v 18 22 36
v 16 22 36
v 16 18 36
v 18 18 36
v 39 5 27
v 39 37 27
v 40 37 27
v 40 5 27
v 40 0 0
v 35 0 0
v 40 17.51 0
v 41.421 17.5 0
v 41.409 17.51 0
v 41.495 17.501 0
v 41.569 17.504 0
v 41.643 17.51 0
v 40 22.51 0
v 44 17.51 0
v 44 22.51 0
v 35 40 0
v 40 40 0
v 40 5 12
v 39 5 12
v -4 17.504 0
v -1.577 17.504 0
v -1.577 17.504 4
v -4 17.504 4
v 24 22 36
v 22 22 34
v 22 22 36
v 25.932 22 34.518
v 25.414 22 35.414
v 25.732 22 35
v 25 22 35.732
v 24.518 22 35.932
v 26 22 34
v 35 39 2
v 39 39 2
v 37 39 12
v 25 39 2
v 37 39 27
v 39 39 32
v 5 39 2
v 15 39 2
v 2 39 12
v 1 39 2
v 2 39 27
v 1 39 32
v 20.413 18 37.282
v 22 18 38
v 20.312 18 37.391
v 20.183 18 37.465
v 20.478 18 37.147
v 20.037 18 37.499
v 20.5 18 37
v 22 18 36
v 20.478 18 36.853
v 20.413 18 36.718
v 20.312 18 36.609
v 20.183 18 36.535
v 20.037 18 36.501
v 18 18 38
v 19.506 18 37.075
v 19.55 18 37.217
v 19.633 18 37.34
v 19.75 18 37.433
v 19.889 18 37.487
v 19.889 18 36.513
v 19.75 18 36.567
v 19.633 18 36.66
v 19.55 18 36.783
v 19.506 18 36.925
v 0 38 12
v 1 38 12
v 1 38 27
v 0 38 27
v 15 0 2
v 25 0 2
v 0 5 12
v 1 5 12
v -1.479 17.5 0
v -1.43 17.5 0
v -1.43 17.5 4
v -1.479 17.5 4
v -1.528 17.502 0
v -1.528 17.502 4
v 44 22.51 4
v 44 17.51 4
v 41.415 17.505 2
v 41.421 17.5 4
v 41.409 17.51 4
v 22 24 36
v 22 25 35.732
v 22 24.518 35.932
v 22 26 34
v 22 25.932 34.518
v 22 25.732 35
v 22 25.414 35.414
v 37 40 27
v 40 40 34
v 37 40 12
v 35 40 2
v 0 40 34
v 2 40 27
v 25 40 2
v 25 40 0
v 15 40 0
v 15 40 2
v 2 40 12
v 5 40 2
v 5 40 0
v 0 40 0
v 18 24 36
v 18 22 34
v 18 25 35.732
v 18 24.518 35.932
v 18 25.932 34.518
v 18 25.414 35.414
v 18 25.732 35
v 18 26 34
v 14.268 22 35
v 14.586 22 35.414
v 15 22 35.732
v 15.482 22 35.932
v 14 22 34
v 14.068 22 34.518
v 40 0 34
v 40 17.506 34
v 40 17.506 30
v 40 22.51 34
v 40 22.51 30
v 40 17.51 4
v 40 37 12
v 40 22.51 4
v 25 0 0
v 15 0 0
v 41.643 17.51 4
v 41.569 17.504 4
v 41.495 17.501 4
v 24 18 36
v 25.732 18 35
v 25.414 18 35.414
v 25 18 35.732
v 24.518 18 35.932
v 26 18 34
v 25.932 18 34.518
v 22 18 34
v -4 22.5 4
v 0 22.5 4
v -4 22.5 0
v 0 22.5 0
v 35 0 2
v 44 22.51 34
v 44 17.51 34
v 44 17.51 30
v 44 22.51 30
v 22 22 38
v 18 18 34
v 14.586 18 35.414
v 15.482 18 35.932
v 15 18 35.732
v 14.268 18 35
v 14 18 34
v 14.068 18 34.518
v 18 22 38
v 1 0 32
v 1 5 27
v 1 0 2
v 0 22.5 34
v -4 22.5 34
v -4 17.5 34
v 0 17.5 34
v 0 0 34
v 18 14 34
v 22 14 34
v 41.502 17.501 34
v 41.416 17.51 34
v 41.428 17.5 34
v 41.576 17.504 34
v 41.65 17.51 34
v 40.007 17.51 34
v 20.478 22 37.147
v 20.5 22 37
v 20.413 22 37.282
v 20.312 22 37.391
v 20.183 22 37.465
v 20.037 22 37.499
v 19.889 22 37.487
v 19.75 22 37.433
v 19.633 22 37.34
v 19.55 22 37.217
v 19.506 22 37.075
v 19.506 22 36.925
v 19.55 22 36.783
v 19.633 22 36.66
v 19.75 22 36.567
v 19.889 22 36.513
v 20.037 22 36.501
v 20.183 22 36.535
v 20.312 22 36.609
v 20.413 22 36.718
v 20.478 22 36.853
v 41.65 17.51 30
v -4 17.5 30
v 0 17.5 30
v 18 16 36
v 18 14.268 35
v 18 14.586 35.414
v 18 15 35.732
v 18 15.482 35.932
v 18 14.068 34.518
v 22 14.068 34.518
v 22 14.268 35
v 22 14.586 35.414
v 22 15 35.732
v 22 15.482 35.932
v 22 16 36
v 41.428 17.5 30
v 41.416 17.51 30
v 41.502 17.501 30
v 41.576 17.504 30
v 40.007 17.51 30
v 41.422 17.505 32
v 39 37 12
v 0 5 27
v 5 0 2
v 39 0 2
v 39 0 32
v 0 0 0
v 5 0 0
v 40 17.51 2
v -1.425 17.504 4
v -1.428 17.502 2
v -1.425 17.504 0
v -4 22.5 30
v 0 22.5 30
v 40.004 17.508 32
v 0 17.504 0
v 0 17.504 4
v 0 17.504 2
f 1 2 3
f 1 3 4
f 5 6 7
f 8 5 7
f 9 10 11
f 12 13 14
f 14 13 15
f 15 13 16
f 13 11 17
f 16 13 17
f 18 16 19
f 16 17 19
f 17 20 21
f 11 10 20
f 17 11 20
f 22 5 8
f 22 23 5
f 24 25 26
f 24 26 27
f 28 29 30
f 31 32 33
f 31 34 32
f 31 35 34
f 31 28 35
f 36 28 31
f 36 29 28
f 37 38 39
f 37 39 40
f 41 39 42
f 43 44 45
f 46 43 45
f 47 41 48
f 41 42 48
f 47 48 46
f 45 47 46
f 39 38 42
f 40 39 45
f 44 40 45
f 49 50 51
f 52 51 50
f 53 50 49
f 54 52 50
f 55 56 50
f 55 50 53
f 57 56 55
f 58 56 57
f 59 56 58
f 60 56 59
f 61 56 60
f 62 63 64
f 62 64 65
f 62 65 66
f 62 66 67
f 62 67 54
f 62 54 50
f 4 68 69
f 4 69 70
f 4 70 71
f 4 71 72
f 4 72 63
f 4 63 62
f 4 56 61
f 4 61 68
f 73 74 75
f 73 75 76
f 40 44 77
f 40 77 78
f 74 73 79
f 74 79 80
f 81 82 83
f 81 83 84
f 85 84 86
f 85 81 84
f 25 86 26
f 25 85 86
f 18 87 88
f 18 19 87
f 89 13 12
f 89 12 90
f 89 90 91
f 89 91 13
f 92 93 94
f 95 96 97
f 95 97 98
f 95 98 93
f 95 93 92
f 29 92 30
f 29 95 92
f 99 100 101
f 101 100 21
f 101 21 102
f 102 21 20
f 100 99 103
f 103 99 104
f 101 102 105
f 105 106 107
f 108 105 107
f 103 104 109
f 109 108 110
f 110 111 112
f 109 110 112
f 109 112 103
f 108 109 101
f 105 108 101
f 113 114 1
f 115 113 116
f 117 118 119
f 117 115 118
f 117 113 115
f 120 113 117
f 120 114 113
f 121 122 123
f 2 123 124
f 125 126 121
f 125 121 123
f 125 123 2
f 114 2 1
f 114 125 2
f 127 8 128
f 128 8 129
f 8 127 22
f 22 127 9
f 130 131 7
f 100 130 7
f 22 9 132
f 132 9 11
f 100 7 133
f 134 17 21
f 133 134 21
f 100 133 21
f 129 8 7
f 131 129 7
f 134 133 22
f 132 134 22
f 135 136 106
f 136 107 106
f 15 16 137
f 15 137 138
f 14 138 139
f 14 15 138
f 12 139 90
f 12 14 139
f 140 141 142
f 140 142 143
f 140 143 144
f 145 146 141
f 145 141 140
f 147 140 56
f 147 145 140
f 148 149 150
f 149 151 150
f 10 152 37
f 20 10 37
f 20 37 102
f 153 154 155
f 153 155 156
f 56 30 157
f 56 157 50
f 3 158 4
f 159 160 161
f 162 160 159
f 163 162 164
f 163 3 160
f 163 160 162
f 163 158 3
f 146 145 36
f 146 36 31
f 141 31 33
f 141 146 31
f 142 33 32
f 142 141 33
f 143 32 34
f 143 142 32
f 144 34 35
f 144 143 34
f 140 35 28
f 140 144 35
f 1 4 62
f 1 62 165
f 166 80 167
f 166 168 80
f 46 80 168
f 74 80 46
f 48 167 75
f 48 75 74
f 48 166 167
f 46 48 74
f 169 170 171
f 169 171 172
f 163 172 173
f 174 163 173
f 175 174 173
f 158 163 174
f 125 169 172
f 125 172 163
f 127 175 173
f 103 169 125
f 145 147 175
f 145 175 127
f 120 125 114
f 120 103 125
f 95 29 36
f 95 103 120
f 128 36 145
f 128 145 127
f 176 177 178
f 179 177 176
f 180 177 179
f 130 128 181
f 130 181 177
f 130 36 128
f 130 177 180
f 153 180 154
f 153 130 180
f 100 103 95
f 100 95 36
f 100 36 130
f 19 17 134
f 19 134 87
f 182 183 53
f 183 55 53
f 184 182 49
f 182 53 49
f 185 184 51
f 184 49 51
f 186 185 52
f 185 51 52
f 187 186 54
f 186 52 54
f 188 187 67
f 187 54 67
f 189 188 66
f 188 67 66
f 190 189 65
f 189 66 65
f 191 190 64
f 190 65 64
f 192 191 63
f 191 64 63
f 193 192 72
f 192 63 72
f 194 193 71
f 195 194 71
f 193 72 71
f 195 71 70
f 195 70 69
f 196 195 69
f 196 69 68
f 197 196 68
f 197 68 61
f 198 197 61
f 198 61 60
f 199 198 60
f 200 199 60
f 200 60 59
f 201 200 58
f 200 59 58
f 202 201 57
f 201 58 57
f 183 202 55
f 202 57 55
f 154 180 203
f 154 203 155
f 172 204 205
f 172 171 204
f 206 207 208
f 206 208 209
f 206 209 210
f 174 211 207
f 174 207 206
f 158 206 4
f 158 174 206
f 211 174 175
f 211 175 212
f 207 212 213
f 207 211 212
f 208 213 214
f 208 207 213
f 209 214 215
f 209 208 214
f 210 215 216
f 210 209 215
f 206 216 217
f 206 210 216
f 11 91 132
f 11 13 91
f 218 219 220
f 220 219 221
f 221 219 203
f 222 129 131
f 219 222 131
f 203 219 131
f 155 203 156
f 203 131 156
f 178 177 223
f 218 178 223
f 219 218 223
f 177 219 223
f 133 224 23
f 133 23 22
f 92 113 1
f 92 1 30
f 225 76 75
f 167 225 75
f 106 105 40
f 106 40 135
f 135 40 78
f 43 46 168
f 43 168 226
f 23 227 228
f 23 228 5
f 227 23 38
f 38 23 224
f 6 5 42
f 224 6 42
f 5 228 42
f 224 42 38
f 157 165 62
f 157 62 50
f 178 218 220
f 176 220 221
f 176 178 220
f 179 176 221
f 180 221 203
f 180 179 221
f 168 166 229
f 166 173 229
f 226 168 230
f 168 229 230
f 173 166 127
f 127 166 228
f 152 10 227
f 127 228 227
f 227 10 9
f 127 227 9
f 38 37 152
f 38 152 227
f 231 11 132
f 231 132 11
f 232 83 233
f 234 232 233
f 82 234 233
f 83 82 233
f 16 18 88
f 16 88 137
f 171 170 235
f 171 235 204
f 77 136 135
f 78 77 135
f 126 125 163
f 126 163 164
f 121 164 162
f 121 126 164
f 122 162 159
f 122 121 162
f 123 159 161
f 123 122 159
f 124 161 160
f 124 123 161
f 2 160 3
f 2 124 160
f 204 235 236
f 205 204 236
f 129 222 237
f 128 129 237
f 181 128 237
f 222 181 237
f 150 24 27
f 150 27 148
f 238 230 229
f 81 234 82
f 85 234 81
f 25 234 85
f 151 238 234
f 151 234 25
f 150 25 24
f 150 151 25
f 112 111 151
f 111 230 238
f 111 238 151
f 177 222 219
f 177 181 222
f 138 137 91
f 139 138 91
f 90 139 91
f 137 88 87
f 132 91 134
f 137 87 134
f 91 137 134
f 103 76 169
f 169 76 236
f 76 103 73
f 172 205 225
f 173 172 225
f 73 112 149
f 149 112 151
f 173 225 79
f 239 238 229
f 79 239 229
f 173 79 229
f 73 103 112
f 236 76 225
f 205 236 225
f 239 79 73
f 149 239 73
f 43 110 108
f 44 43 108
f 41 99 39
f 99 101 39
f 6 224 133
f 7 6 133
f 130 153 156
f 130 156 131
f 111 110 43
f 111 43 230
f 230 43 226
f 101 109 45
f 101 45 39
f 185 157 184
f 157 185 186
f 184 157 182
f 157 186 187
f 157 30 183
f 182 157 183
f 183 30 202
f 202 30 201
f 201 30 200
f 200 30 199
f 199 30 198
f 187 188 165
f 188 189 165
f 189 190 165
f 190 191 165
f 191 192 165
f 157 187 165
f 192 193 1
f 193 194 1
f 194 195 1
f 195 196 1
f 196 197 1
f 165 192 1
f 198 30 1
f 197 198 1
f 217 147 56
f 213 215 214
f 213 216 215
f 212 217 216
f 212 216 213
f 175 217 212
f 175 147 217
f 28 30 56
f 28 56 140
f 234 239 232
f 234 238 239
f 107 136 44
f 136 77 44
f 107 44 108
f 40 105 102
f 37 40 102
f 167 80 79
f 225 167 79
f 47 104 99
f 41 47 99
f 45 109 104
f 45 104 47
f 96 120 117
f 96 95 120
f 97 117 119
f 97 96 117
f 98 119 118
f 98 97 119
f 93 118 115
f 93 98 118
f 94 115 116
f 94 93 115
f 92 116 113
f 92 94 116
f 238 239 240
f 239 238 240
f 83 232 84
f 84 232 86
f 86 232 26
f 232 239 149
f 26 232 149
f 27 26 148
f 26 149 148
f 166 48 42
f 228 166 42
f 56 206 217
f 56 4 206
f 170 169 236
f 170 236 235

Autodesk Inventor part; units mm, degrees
ref_plane "YZ Plane" through (0, 0, 0) normal (1, 0, 0) x (0, 1, 0)
ref_plane "XZ Plane" through (0, 0, 0) normal (0, 1, 0) x (-1, 0, 0)
ref_plane "XY Plane" through (0, 0, 0) normal (0, 0, 1) x (1, 0, 0)
sketch "Esboço1" plane through (0, 0, 0) normal (0, 0, 1) x (1, 0, 0)
  line L0 (0, 0) -> (40, 0)
  line L1 (40, 0) -> (40, 40)
  line L2 (40, 40) -> (0, 40)
  line L3 (0, 40) -> (0, 0)
  dimension "d0" = 40
  dimension "d1" = 40
extrude "Extrusão1" add sketch "Esboço1" along normal blind 2
sketch "Esboço2" plane through (0, 0, 2) normal (0, 0, 1) x (1, 0, 0)
  line L0 (0, 40) -> (0, 0) projected
  line L1 (0, 0) -> (1, 0)
  line L2 (0, 0) -> (40, 0) projected
  line L3 (0, 0) -> (0, 40)
  line L4 (40, 40) -> (0, 40) projected
  line L5 (40, 0) -> (40, 40) projected
  line L6 (40, 40) -> (40, 0)
  line L7 (40, 0) -> (39, 0)
  line L8 (39, 0) -> (39, 39)
  line L9 (39, 39) -> (1, 39)
  line L10 (1, 39) -> (1, 0)
extrude "Extrusão2" add sketch "Esboço2" along normal blind 10 contours L4 L5 L2 L8 L9 L10 L1 L0
sketch "Esboço3" plane through (0, 0, 12) normal (0, 0, 1) x (1, 0, 0)
  line L0 (0, 40) -> (2, 40)
  line L1 (40, 40) -> (0, 40) projected
  line L2 (1, 39) -> (39, 39) projected
  line L3 (2, 39) -> (1, 39)
  line L4 (1, 39) -> (1, 38)
  line L5 (1, 0) -> (1, 39) projected
  line L6 (0, 38) -> (0, 40)
  line L7 (2, 40) -> (2, 39)
  line L8 (1, 38) -> (0, 38)
  line L9 (0, 40) -> (0, 0) projected
extrude "Extrusão3" add sketch "Esboço3" along normal blind 20
sketch "Esboço4" plane through (0, 0, 12) normal (0, 0, 1) x (1, 0, 0)
  line L0 (40, 40) -> (37, 40)
  line L1 (40, 40) -> (0, 40) projected
  line L2 (39, 39) -> (1, 39) projected
  line L3 (37, 39) -> (39, 39)
  line L4 (39, 39) -> (39, 37)
  line L5 (39, 39) -> (39, 0) projected
  line L6 (40, 0) -> (40, 40) projected
  line L7 (40, 37) -> (40, 40)
  line L8 (37, 40) -> (37, 39)
  line L9 (39, 37) -> (40, 37)
  line L10 (40, 40) -> (37, 40)
  line L11 (37, 39) -> (39, 39)
  line L12 (39, 39) -> (39, 37)
  point P0 (0, 0)
extrude "Extrusão4" add sketch "Esboço4" along normal blind 20
sketch "Esboço6" plane through (0, 0, 12) normal (0, 0, 1) x (1, 0, 0)
  line L0 (0, 38) -> (0, 0) projected
  line L1 (1, 0) -> (1, 38) projected
  line L2 (0, 0) -> (1, 0)
  line L3 (1, 0) -> (1, 5)
  line L4 (1, 5) -> (0, 5)
  line L5 (0, 5) -> (0, 0)
  line L6 (0, 0) -> (40, 0) projected
  line L7 (39, 0) -> (39, 39) projected
  line L8 (40, 0) -> (39, 0)
  line L9 (39, 0) -> (39, 5)
  line L10 (39, 5) -> (40, 5)
  line L11 (40, 5) -> (40, 0)
extrude "Extrusão5" add sketch "Esboço6" along normal blind 20
sketch "Esboço7" plane through (0, 0, 32) normal (0, 0, 1) x (1, 0, 0)
  line L0 (0, 38) -> (0, 5) projected
  line L1 (0, 38) -> (1, 38)
  line L2 (1, 5) -> (1, 38) projected
  line L3 (1, 38) -> (1, 5)
  line L4 (1, 5) -> (0, 5)
  line L5 (0, 40) -> (0, 38) projected
  line L6 (0, 5) -> (0, 38)
  point P0 (0, 0)
extrude "Extrusão6" add sketch "Esboço7" against normal blind 5
sketch "Esboço8" plane through (0, 0, 32) normal (0, 0, 1) x (1, 0, 0)
  line L0 (2, 40) -> (0, 40) projected
  line L1 (39, 39) -> (1, 39) projected
  line L2 (2, 40) -> (37, 40)
  line L3 (37, 40) -> (37, 39)
  line L4 (37, 39) -> (2, 39)
  line L5 (2, 39) -> (2, 40)
  point P0 (0, 0)
extrude "Extrusão7" add sketch "Esboço8" against normal blind 5
sketch "Esboço9" plane through (0, 0, 32) normal (0, 0, 1) x (1, 0, 0)
  line L0 (40, 0) -> (40, 40) projected
  line L1 (39, 37) -> (40, 37)
  line L2 (40, 37) -> (40, 5)
  line L3 (40, 5) -> (39, 5)
  line L4 (39, 5) -> (39, 37)
  point P0 (0, 0)
extrude "Extrusão8" add sketch "Esboço9" against normal blind 5
sketch "Esboço10" plane through (0, 0, 32) normal (0, 0, 1) x (1, 0, 0)
  line L0 (40, 40) -> (0, 40) projected
  line L1 (0, 40) -> (0, 0) projected
  line L2 (40, 40) -> (0, 40)
  line L3 (0, 40) -> (0, 0)
  line L4 (0, 0) -> (40, 0)
  line L5 (40, 0) -> (40, 40)
extrude "Extrusão9" add sketch "Esboço10" along normal blind 2
sketch "Esboço14" plane through (0, 0, 34) normal (0, 0, 1) x (1, 0, 0)
  line L0 (0, 40) -> (0, 0) projected
  line L1 (0, 40) -> (0, 20)
  circle A0 centre (-1.4378, 20) radius 2.5
  line L2 (-1.4378, 17.5) -> (-0.8668, 18) construction
  line L3 (-0.8668, 18) -> (0, 17.5) construction
  spline S0 degree 2 poles (-1.4378, 17.5) (-0.8668, 18) (0, 17.5) knots 1 1 1 2 2 2
  line L4 (40, 0) -> (40, 40) projected
  line L5 (40, 40) -> (40, 0)
  line L6 (40, 40) -> (0, 40) projected
  line L7 (0, 40) -> (0, 0)
  circle A1 centre (41.4279, 20) radius 2.5
  line L8 (41.4279, 17.5) -> (40.8569, 18) construction
  line L9 (40.8569, 18) -> (39.9901, 17.5) construction
  spline S1 degree 2 poles (41.4279, 17.5) (40.8569, 18) (39.9901, 17.5) knots 1 1 1 2 2 2
  line L10 (-1.4378, 20) -> (40, 20)
  line L11 (-1.4378, 22.5) -> (-0.8668, 22) construction
  line L12 (-0.8668, 22) -> (0, 22.5) construction
  spline S2 degree 2 poles (-1.4378, 22.5) (-0.8668, 22) (0, 22.5) knots 1 1 1 2 2 2
  spline S3 degree 2 poles (41.4279, 22.5) (40.8569, 22) (39.9901, 22.5) knots 1 1 1 2 2 2
  line L13 (41.4279, 22.5) -> (40.8569, 22) construction
  line L14 (40.8569, 22) -> (39.9901, 22.5) construction
  point P0 (40, 22.4943)
  point P1 (40, 17.5057)
  point P2 (0, 22.5)
  dimension "d30" = 5
extrude "Extrusão11" add sketch "Esboço14" against normal blind 4 contours L0 A0 S2 | L0 A0 S0 S2 | S3 A1 L4 | A1 S3 S1 L4 | L0 S0 A0 | A1 S1 L4
sketch "Esboço15" plane through (0, 0, 0) normal (0, 0, -1) x (-1, 0, 0)
  spline S0 degree 2 poles (1.4304, 17.5) (0.8594, 18) (-0.0074, 17.5) knots 1 1 1 2 2 2
  line L0 (1.4304, 17.5) -> (0.8594, 18) construction
  line L1 (0.8594, 18) -> (-0.0074, 17.5) construction
  circle A0 centre (1.4304, 20) radius 2.5
  spline S1 degree 2 poles (1.4304, 22.5) (0.8594, 22) (-0.0074, 22.5) knots 1 1 1 2 2 2
  line L2 (1.4304, 22.5) -> (0.8594, 22) construction
  line L3 (0.8594, 22) -> (-0.0074, 22.5) construction
  line L4 (-40, 40) -> (0, 40) projected
  line L5 (-40, 40) -> (-40, 0)
  line L6 (-39, 0) -> (-39, 39) projected
  spline S2 degree 2 poles (-41.4206, 17.5) (-40.8496, 18) (-39.9828, 17.5) knots 1 1 1 2 2 2
  line L7 (-41.4206, 17.5) -> (-40.8496, 18) construction
  line L8 (-40.8496, 18) -> (-39.9828, 17.5) construction
  circle A1 centre (-41.4206, 20) radius 2.5
  spline S3 degree 2 poles (-41.4206, 22.5) (-40.8496, 22) (-39.9828, 22.5) knots 1 1 1 2 2 2
  line L9 (-41.4206, 22.5) -> (-40.8496, 22) construction
  line L10 (-40.8496, 22) -> (-39.9828, 22.5) construction
  line L11 (0, 40) -> (0, 0) projected
  line L12 (0, 17.9497) -> (0, 22.0503)
  line L13 (-40, 0) -> (-40, 40) projected
  line L14 (-40, 17.9428) -> (-40, 22.0572)
  line L15 (-40, 17.9428) -> (-40, 22.0572)
  line L16 (-0.0074, 17.5) -> (3.9926, 17.5)
  line L17 (3.9926, 17.5) -> (3.9926, 22.5)
  line L18 (3.9926, 22.5) -> (-0.0074, 22.5)
  line L19 (-0.0074, 22.5) -> (-0.0074, 17.5)
  point P0 (1.4378, 22.5)
  point P1 (0, 17.5043)
  point P2 (0, 22.4957)
  point P3 (-40, 17.5099)
  point P4 (-40, 22.4901)
  dimension "d51" = 4
extrude "Extrusão12" add sketch "Esboço15" against normal blind 4 contours S0 A0 L11 S1 | L5 A1 S3 | S0 L11 A0 | L11 S1 A0 | L5 A1 S2 S3 | L5 S2 A1
sketch "Esboço20" plane through (0, 0, 2) normal (0, 0, 1) x (1, 0, 0)
  line L0 (0, 0) -> (40, 0) projected
  line L1 (0, 0) -> (10, 0)
  line L2 (10, 40) -> (0, 40)
  line L3 (0, 40) -> (0, 0)
  line L4 (40, 40) -> (0, 40) projected
  line L5 (25, 0) -> (35, 0)
  line L6 (35, 0) -> (35, 40)
  line L7 (35, 40) -> (25, 40)
  line L8 (25, 40) -> (25, 0)
  line L9 (1, 0) -> (39, 0) projected
  line L10 (5, 0) -> (15, 0)
  line L11 (15, 0) -> (15, 40)
  line L12 (15, 40) -> (5, 40)
  line L13 (5, 40) -> (5, 0)
  dimension "d44" = 10
  dimension "d45" = 10
  dimension "d46" = 40
extrude "Extrusão15" cut sketch "Esboço20" against normal blind 10 contours L13 L2 L4 L11 L0 | L8 L4 L6 L0
sketch "Esboço21" plane through (0, 0, 34) normal (0, 0, 1) x (1, 0, 0)
  line L0 (0, 40) -> (0, 22.5) projected
  line L1 (0, 22.5) -> (-4, 22.5)
  line L2 (-4, 22.5) -> (-4, 17.5)
  line L3 (-4, 17.5) -> (0, 17.5)
  line L4 (0, 17.5) -> (0, 22.5)
  point P0 (0, 0)
extrude "Extrusão16" add sketch "Esboço21" against normal blind 4
sketch "Esboço22" plane through (0, 0, 0) normal (0, 0, -1) x (-1, 0, 0)
  line L0 (0, 22.4957) -> (0, 17.5043) projected
  line L1 (0, 22.5) -> (4, 22.5) projected
  line L2 (0, 17.5043) -> (4, 17.5043)
  line L3 (4, 17.5043) -> (4, 22.5)
  line L4 (4, 22.5) -> (0, 22.5)
  line L5 (0, 22.5) -> (0, 17.5043)
  point P0 (0, 0)
extrude "Extrusão17" add sketch "Esboço22" against normal blind 4
sketch "Esboço23" plane through (0, 0, 34) normal (0, 0, 1) x (1, 0, 0)
  line L0 (40, 0) -> (40, 17.5099) projected
  line L1 (40, 17.5099) -> (44, 17.5099)
  line L2 (44, 17.5099) -> (44, 22.5099)
  line L3 (44, 22.5099) -> (40, 22.5099)
  line L4 (40, 22.5099) -> (40, 17.5099)
  point P0 (0, 0)
  dimension "d54" = 5
extrude "Extrusão18" add sketch "Esboço23" against normal blind 4
sketch "Esboço24" plane through (0, 0, 0) normal (0, 0, -1) x (-1, 0, 0)
  line L0 (-40, 22.4901) -> (-40, 40) projected
  line L1 (-41.6498, 17.5099) -> (-44, 17.5099) projected
  line L2 (-40, 22.5099) -> (-44, 22.5099)
  line L3 (-44, 22.5099) -> (-44, 17.5099)
  line L4 (-44, 17.5099) -> (-40, 17.5099)
  line L5 (-40, 17.5099) -> (-40, 22.5099)
  point P0 (0, 0)
  dimension "d57" = 5
extrude "Extrusão19" add sketch "Esboço24" against normal blind 4
sketch "Esboço26" plane through (0, 0, 34) normal (0, 0, 1) x (1, 0, 0)
  line L0 (0, 40) -> (0, 22.5) projected
  line L1 (0, 40) -> (20, 40)
  line L2 (15, 40) -> (5, 40) projected
  line L3 (20, 40) -> (20, 20)
  line L4 (20, 20) -> (20, 22)
  line L5 (20, 20) -> (20, 18)
  line L6 (20, 40) -> (20, 20)
  line L7 (25, 40) -> (15, 40) projected
  line L8 (20, 20) -> (22, 20)
  line L9 (20, 20) -> (18, 20)
  line L10 (18, 20) -> (18, 22)
  line L11 (18, 22) -> (20, 22)
  line L12 (22, 22) -> (22, 20)
  line L13 (22, 22) -> (20, 22)
  line L14 (22, 20) -> (22, 18)
  line L15 (22, 18) -> (20, 18)
  line L16 (18, 18) -> (18, 20)
  line L17 (18.1558, 18) -> (20, 18)
  line L18 (18, 18) -> (18.1677, 18)
  point P0 (0, 0)
extrude "Extrusão20" add sketch "Esboço26" along normal blind 4
sketch "Esboço27" plane through (0, 0, 34) normal (0, 0, 1) x (1, 0, 0)
  line L0 (22, 22) -> (22, 18) projected
  line L1 (22, 18) -> (22, 14)
  line L2 (22, 14) -> (18, 14)
  line L3 (18, 14) -> (18, 18)
  line L4 (18, 18) -> (14, 18)
  line L5 (14, 18) -> (14, 22)
  line L6 (18, 22) -> (22, 22) projected
  line L7 (14, 22) -> (18, 22)
  line L8 (18, 22) -> (18, 26)
  line L9 (18, 26) -> (22, 26)
  line L10 (22, 26) -> (22, 22)
  line L11 (22, 22) -> (26, 22)
  line L12 (26, 22) -> (26, 18)
  line L13 (26, 18) -> (22, 18)
  point P0 (0, 0)
extrude "Extrusão21" add sketch "Esboço27" along normal blind 2
fillet "Arredondamento1" radius 2 4 edges at (26, 20, 36) (20, 26, 36) (14, 20, 36) (20, 14, 36)
sketch "Esboço30" plane through (18, 18, 38) normal (0, -1, 0) x (1, 0, 0)
  line L0 (4, -2) -> (0, -2) projected
  line L1 (0, -2) -> (0, -1)
  line L2 (0, -1) -> (4, -1)
  line L3 (4, -1) -> (2, -1)
  circle A0 centre (2, -1) radius 0.5
  point P0 (-18, -38)
  dimension "d65" = 1
extrude "Extrusão22" cut sketch "Esboço30" against normal through all
properties part number "elevador_caixa_com_estabi v2"
